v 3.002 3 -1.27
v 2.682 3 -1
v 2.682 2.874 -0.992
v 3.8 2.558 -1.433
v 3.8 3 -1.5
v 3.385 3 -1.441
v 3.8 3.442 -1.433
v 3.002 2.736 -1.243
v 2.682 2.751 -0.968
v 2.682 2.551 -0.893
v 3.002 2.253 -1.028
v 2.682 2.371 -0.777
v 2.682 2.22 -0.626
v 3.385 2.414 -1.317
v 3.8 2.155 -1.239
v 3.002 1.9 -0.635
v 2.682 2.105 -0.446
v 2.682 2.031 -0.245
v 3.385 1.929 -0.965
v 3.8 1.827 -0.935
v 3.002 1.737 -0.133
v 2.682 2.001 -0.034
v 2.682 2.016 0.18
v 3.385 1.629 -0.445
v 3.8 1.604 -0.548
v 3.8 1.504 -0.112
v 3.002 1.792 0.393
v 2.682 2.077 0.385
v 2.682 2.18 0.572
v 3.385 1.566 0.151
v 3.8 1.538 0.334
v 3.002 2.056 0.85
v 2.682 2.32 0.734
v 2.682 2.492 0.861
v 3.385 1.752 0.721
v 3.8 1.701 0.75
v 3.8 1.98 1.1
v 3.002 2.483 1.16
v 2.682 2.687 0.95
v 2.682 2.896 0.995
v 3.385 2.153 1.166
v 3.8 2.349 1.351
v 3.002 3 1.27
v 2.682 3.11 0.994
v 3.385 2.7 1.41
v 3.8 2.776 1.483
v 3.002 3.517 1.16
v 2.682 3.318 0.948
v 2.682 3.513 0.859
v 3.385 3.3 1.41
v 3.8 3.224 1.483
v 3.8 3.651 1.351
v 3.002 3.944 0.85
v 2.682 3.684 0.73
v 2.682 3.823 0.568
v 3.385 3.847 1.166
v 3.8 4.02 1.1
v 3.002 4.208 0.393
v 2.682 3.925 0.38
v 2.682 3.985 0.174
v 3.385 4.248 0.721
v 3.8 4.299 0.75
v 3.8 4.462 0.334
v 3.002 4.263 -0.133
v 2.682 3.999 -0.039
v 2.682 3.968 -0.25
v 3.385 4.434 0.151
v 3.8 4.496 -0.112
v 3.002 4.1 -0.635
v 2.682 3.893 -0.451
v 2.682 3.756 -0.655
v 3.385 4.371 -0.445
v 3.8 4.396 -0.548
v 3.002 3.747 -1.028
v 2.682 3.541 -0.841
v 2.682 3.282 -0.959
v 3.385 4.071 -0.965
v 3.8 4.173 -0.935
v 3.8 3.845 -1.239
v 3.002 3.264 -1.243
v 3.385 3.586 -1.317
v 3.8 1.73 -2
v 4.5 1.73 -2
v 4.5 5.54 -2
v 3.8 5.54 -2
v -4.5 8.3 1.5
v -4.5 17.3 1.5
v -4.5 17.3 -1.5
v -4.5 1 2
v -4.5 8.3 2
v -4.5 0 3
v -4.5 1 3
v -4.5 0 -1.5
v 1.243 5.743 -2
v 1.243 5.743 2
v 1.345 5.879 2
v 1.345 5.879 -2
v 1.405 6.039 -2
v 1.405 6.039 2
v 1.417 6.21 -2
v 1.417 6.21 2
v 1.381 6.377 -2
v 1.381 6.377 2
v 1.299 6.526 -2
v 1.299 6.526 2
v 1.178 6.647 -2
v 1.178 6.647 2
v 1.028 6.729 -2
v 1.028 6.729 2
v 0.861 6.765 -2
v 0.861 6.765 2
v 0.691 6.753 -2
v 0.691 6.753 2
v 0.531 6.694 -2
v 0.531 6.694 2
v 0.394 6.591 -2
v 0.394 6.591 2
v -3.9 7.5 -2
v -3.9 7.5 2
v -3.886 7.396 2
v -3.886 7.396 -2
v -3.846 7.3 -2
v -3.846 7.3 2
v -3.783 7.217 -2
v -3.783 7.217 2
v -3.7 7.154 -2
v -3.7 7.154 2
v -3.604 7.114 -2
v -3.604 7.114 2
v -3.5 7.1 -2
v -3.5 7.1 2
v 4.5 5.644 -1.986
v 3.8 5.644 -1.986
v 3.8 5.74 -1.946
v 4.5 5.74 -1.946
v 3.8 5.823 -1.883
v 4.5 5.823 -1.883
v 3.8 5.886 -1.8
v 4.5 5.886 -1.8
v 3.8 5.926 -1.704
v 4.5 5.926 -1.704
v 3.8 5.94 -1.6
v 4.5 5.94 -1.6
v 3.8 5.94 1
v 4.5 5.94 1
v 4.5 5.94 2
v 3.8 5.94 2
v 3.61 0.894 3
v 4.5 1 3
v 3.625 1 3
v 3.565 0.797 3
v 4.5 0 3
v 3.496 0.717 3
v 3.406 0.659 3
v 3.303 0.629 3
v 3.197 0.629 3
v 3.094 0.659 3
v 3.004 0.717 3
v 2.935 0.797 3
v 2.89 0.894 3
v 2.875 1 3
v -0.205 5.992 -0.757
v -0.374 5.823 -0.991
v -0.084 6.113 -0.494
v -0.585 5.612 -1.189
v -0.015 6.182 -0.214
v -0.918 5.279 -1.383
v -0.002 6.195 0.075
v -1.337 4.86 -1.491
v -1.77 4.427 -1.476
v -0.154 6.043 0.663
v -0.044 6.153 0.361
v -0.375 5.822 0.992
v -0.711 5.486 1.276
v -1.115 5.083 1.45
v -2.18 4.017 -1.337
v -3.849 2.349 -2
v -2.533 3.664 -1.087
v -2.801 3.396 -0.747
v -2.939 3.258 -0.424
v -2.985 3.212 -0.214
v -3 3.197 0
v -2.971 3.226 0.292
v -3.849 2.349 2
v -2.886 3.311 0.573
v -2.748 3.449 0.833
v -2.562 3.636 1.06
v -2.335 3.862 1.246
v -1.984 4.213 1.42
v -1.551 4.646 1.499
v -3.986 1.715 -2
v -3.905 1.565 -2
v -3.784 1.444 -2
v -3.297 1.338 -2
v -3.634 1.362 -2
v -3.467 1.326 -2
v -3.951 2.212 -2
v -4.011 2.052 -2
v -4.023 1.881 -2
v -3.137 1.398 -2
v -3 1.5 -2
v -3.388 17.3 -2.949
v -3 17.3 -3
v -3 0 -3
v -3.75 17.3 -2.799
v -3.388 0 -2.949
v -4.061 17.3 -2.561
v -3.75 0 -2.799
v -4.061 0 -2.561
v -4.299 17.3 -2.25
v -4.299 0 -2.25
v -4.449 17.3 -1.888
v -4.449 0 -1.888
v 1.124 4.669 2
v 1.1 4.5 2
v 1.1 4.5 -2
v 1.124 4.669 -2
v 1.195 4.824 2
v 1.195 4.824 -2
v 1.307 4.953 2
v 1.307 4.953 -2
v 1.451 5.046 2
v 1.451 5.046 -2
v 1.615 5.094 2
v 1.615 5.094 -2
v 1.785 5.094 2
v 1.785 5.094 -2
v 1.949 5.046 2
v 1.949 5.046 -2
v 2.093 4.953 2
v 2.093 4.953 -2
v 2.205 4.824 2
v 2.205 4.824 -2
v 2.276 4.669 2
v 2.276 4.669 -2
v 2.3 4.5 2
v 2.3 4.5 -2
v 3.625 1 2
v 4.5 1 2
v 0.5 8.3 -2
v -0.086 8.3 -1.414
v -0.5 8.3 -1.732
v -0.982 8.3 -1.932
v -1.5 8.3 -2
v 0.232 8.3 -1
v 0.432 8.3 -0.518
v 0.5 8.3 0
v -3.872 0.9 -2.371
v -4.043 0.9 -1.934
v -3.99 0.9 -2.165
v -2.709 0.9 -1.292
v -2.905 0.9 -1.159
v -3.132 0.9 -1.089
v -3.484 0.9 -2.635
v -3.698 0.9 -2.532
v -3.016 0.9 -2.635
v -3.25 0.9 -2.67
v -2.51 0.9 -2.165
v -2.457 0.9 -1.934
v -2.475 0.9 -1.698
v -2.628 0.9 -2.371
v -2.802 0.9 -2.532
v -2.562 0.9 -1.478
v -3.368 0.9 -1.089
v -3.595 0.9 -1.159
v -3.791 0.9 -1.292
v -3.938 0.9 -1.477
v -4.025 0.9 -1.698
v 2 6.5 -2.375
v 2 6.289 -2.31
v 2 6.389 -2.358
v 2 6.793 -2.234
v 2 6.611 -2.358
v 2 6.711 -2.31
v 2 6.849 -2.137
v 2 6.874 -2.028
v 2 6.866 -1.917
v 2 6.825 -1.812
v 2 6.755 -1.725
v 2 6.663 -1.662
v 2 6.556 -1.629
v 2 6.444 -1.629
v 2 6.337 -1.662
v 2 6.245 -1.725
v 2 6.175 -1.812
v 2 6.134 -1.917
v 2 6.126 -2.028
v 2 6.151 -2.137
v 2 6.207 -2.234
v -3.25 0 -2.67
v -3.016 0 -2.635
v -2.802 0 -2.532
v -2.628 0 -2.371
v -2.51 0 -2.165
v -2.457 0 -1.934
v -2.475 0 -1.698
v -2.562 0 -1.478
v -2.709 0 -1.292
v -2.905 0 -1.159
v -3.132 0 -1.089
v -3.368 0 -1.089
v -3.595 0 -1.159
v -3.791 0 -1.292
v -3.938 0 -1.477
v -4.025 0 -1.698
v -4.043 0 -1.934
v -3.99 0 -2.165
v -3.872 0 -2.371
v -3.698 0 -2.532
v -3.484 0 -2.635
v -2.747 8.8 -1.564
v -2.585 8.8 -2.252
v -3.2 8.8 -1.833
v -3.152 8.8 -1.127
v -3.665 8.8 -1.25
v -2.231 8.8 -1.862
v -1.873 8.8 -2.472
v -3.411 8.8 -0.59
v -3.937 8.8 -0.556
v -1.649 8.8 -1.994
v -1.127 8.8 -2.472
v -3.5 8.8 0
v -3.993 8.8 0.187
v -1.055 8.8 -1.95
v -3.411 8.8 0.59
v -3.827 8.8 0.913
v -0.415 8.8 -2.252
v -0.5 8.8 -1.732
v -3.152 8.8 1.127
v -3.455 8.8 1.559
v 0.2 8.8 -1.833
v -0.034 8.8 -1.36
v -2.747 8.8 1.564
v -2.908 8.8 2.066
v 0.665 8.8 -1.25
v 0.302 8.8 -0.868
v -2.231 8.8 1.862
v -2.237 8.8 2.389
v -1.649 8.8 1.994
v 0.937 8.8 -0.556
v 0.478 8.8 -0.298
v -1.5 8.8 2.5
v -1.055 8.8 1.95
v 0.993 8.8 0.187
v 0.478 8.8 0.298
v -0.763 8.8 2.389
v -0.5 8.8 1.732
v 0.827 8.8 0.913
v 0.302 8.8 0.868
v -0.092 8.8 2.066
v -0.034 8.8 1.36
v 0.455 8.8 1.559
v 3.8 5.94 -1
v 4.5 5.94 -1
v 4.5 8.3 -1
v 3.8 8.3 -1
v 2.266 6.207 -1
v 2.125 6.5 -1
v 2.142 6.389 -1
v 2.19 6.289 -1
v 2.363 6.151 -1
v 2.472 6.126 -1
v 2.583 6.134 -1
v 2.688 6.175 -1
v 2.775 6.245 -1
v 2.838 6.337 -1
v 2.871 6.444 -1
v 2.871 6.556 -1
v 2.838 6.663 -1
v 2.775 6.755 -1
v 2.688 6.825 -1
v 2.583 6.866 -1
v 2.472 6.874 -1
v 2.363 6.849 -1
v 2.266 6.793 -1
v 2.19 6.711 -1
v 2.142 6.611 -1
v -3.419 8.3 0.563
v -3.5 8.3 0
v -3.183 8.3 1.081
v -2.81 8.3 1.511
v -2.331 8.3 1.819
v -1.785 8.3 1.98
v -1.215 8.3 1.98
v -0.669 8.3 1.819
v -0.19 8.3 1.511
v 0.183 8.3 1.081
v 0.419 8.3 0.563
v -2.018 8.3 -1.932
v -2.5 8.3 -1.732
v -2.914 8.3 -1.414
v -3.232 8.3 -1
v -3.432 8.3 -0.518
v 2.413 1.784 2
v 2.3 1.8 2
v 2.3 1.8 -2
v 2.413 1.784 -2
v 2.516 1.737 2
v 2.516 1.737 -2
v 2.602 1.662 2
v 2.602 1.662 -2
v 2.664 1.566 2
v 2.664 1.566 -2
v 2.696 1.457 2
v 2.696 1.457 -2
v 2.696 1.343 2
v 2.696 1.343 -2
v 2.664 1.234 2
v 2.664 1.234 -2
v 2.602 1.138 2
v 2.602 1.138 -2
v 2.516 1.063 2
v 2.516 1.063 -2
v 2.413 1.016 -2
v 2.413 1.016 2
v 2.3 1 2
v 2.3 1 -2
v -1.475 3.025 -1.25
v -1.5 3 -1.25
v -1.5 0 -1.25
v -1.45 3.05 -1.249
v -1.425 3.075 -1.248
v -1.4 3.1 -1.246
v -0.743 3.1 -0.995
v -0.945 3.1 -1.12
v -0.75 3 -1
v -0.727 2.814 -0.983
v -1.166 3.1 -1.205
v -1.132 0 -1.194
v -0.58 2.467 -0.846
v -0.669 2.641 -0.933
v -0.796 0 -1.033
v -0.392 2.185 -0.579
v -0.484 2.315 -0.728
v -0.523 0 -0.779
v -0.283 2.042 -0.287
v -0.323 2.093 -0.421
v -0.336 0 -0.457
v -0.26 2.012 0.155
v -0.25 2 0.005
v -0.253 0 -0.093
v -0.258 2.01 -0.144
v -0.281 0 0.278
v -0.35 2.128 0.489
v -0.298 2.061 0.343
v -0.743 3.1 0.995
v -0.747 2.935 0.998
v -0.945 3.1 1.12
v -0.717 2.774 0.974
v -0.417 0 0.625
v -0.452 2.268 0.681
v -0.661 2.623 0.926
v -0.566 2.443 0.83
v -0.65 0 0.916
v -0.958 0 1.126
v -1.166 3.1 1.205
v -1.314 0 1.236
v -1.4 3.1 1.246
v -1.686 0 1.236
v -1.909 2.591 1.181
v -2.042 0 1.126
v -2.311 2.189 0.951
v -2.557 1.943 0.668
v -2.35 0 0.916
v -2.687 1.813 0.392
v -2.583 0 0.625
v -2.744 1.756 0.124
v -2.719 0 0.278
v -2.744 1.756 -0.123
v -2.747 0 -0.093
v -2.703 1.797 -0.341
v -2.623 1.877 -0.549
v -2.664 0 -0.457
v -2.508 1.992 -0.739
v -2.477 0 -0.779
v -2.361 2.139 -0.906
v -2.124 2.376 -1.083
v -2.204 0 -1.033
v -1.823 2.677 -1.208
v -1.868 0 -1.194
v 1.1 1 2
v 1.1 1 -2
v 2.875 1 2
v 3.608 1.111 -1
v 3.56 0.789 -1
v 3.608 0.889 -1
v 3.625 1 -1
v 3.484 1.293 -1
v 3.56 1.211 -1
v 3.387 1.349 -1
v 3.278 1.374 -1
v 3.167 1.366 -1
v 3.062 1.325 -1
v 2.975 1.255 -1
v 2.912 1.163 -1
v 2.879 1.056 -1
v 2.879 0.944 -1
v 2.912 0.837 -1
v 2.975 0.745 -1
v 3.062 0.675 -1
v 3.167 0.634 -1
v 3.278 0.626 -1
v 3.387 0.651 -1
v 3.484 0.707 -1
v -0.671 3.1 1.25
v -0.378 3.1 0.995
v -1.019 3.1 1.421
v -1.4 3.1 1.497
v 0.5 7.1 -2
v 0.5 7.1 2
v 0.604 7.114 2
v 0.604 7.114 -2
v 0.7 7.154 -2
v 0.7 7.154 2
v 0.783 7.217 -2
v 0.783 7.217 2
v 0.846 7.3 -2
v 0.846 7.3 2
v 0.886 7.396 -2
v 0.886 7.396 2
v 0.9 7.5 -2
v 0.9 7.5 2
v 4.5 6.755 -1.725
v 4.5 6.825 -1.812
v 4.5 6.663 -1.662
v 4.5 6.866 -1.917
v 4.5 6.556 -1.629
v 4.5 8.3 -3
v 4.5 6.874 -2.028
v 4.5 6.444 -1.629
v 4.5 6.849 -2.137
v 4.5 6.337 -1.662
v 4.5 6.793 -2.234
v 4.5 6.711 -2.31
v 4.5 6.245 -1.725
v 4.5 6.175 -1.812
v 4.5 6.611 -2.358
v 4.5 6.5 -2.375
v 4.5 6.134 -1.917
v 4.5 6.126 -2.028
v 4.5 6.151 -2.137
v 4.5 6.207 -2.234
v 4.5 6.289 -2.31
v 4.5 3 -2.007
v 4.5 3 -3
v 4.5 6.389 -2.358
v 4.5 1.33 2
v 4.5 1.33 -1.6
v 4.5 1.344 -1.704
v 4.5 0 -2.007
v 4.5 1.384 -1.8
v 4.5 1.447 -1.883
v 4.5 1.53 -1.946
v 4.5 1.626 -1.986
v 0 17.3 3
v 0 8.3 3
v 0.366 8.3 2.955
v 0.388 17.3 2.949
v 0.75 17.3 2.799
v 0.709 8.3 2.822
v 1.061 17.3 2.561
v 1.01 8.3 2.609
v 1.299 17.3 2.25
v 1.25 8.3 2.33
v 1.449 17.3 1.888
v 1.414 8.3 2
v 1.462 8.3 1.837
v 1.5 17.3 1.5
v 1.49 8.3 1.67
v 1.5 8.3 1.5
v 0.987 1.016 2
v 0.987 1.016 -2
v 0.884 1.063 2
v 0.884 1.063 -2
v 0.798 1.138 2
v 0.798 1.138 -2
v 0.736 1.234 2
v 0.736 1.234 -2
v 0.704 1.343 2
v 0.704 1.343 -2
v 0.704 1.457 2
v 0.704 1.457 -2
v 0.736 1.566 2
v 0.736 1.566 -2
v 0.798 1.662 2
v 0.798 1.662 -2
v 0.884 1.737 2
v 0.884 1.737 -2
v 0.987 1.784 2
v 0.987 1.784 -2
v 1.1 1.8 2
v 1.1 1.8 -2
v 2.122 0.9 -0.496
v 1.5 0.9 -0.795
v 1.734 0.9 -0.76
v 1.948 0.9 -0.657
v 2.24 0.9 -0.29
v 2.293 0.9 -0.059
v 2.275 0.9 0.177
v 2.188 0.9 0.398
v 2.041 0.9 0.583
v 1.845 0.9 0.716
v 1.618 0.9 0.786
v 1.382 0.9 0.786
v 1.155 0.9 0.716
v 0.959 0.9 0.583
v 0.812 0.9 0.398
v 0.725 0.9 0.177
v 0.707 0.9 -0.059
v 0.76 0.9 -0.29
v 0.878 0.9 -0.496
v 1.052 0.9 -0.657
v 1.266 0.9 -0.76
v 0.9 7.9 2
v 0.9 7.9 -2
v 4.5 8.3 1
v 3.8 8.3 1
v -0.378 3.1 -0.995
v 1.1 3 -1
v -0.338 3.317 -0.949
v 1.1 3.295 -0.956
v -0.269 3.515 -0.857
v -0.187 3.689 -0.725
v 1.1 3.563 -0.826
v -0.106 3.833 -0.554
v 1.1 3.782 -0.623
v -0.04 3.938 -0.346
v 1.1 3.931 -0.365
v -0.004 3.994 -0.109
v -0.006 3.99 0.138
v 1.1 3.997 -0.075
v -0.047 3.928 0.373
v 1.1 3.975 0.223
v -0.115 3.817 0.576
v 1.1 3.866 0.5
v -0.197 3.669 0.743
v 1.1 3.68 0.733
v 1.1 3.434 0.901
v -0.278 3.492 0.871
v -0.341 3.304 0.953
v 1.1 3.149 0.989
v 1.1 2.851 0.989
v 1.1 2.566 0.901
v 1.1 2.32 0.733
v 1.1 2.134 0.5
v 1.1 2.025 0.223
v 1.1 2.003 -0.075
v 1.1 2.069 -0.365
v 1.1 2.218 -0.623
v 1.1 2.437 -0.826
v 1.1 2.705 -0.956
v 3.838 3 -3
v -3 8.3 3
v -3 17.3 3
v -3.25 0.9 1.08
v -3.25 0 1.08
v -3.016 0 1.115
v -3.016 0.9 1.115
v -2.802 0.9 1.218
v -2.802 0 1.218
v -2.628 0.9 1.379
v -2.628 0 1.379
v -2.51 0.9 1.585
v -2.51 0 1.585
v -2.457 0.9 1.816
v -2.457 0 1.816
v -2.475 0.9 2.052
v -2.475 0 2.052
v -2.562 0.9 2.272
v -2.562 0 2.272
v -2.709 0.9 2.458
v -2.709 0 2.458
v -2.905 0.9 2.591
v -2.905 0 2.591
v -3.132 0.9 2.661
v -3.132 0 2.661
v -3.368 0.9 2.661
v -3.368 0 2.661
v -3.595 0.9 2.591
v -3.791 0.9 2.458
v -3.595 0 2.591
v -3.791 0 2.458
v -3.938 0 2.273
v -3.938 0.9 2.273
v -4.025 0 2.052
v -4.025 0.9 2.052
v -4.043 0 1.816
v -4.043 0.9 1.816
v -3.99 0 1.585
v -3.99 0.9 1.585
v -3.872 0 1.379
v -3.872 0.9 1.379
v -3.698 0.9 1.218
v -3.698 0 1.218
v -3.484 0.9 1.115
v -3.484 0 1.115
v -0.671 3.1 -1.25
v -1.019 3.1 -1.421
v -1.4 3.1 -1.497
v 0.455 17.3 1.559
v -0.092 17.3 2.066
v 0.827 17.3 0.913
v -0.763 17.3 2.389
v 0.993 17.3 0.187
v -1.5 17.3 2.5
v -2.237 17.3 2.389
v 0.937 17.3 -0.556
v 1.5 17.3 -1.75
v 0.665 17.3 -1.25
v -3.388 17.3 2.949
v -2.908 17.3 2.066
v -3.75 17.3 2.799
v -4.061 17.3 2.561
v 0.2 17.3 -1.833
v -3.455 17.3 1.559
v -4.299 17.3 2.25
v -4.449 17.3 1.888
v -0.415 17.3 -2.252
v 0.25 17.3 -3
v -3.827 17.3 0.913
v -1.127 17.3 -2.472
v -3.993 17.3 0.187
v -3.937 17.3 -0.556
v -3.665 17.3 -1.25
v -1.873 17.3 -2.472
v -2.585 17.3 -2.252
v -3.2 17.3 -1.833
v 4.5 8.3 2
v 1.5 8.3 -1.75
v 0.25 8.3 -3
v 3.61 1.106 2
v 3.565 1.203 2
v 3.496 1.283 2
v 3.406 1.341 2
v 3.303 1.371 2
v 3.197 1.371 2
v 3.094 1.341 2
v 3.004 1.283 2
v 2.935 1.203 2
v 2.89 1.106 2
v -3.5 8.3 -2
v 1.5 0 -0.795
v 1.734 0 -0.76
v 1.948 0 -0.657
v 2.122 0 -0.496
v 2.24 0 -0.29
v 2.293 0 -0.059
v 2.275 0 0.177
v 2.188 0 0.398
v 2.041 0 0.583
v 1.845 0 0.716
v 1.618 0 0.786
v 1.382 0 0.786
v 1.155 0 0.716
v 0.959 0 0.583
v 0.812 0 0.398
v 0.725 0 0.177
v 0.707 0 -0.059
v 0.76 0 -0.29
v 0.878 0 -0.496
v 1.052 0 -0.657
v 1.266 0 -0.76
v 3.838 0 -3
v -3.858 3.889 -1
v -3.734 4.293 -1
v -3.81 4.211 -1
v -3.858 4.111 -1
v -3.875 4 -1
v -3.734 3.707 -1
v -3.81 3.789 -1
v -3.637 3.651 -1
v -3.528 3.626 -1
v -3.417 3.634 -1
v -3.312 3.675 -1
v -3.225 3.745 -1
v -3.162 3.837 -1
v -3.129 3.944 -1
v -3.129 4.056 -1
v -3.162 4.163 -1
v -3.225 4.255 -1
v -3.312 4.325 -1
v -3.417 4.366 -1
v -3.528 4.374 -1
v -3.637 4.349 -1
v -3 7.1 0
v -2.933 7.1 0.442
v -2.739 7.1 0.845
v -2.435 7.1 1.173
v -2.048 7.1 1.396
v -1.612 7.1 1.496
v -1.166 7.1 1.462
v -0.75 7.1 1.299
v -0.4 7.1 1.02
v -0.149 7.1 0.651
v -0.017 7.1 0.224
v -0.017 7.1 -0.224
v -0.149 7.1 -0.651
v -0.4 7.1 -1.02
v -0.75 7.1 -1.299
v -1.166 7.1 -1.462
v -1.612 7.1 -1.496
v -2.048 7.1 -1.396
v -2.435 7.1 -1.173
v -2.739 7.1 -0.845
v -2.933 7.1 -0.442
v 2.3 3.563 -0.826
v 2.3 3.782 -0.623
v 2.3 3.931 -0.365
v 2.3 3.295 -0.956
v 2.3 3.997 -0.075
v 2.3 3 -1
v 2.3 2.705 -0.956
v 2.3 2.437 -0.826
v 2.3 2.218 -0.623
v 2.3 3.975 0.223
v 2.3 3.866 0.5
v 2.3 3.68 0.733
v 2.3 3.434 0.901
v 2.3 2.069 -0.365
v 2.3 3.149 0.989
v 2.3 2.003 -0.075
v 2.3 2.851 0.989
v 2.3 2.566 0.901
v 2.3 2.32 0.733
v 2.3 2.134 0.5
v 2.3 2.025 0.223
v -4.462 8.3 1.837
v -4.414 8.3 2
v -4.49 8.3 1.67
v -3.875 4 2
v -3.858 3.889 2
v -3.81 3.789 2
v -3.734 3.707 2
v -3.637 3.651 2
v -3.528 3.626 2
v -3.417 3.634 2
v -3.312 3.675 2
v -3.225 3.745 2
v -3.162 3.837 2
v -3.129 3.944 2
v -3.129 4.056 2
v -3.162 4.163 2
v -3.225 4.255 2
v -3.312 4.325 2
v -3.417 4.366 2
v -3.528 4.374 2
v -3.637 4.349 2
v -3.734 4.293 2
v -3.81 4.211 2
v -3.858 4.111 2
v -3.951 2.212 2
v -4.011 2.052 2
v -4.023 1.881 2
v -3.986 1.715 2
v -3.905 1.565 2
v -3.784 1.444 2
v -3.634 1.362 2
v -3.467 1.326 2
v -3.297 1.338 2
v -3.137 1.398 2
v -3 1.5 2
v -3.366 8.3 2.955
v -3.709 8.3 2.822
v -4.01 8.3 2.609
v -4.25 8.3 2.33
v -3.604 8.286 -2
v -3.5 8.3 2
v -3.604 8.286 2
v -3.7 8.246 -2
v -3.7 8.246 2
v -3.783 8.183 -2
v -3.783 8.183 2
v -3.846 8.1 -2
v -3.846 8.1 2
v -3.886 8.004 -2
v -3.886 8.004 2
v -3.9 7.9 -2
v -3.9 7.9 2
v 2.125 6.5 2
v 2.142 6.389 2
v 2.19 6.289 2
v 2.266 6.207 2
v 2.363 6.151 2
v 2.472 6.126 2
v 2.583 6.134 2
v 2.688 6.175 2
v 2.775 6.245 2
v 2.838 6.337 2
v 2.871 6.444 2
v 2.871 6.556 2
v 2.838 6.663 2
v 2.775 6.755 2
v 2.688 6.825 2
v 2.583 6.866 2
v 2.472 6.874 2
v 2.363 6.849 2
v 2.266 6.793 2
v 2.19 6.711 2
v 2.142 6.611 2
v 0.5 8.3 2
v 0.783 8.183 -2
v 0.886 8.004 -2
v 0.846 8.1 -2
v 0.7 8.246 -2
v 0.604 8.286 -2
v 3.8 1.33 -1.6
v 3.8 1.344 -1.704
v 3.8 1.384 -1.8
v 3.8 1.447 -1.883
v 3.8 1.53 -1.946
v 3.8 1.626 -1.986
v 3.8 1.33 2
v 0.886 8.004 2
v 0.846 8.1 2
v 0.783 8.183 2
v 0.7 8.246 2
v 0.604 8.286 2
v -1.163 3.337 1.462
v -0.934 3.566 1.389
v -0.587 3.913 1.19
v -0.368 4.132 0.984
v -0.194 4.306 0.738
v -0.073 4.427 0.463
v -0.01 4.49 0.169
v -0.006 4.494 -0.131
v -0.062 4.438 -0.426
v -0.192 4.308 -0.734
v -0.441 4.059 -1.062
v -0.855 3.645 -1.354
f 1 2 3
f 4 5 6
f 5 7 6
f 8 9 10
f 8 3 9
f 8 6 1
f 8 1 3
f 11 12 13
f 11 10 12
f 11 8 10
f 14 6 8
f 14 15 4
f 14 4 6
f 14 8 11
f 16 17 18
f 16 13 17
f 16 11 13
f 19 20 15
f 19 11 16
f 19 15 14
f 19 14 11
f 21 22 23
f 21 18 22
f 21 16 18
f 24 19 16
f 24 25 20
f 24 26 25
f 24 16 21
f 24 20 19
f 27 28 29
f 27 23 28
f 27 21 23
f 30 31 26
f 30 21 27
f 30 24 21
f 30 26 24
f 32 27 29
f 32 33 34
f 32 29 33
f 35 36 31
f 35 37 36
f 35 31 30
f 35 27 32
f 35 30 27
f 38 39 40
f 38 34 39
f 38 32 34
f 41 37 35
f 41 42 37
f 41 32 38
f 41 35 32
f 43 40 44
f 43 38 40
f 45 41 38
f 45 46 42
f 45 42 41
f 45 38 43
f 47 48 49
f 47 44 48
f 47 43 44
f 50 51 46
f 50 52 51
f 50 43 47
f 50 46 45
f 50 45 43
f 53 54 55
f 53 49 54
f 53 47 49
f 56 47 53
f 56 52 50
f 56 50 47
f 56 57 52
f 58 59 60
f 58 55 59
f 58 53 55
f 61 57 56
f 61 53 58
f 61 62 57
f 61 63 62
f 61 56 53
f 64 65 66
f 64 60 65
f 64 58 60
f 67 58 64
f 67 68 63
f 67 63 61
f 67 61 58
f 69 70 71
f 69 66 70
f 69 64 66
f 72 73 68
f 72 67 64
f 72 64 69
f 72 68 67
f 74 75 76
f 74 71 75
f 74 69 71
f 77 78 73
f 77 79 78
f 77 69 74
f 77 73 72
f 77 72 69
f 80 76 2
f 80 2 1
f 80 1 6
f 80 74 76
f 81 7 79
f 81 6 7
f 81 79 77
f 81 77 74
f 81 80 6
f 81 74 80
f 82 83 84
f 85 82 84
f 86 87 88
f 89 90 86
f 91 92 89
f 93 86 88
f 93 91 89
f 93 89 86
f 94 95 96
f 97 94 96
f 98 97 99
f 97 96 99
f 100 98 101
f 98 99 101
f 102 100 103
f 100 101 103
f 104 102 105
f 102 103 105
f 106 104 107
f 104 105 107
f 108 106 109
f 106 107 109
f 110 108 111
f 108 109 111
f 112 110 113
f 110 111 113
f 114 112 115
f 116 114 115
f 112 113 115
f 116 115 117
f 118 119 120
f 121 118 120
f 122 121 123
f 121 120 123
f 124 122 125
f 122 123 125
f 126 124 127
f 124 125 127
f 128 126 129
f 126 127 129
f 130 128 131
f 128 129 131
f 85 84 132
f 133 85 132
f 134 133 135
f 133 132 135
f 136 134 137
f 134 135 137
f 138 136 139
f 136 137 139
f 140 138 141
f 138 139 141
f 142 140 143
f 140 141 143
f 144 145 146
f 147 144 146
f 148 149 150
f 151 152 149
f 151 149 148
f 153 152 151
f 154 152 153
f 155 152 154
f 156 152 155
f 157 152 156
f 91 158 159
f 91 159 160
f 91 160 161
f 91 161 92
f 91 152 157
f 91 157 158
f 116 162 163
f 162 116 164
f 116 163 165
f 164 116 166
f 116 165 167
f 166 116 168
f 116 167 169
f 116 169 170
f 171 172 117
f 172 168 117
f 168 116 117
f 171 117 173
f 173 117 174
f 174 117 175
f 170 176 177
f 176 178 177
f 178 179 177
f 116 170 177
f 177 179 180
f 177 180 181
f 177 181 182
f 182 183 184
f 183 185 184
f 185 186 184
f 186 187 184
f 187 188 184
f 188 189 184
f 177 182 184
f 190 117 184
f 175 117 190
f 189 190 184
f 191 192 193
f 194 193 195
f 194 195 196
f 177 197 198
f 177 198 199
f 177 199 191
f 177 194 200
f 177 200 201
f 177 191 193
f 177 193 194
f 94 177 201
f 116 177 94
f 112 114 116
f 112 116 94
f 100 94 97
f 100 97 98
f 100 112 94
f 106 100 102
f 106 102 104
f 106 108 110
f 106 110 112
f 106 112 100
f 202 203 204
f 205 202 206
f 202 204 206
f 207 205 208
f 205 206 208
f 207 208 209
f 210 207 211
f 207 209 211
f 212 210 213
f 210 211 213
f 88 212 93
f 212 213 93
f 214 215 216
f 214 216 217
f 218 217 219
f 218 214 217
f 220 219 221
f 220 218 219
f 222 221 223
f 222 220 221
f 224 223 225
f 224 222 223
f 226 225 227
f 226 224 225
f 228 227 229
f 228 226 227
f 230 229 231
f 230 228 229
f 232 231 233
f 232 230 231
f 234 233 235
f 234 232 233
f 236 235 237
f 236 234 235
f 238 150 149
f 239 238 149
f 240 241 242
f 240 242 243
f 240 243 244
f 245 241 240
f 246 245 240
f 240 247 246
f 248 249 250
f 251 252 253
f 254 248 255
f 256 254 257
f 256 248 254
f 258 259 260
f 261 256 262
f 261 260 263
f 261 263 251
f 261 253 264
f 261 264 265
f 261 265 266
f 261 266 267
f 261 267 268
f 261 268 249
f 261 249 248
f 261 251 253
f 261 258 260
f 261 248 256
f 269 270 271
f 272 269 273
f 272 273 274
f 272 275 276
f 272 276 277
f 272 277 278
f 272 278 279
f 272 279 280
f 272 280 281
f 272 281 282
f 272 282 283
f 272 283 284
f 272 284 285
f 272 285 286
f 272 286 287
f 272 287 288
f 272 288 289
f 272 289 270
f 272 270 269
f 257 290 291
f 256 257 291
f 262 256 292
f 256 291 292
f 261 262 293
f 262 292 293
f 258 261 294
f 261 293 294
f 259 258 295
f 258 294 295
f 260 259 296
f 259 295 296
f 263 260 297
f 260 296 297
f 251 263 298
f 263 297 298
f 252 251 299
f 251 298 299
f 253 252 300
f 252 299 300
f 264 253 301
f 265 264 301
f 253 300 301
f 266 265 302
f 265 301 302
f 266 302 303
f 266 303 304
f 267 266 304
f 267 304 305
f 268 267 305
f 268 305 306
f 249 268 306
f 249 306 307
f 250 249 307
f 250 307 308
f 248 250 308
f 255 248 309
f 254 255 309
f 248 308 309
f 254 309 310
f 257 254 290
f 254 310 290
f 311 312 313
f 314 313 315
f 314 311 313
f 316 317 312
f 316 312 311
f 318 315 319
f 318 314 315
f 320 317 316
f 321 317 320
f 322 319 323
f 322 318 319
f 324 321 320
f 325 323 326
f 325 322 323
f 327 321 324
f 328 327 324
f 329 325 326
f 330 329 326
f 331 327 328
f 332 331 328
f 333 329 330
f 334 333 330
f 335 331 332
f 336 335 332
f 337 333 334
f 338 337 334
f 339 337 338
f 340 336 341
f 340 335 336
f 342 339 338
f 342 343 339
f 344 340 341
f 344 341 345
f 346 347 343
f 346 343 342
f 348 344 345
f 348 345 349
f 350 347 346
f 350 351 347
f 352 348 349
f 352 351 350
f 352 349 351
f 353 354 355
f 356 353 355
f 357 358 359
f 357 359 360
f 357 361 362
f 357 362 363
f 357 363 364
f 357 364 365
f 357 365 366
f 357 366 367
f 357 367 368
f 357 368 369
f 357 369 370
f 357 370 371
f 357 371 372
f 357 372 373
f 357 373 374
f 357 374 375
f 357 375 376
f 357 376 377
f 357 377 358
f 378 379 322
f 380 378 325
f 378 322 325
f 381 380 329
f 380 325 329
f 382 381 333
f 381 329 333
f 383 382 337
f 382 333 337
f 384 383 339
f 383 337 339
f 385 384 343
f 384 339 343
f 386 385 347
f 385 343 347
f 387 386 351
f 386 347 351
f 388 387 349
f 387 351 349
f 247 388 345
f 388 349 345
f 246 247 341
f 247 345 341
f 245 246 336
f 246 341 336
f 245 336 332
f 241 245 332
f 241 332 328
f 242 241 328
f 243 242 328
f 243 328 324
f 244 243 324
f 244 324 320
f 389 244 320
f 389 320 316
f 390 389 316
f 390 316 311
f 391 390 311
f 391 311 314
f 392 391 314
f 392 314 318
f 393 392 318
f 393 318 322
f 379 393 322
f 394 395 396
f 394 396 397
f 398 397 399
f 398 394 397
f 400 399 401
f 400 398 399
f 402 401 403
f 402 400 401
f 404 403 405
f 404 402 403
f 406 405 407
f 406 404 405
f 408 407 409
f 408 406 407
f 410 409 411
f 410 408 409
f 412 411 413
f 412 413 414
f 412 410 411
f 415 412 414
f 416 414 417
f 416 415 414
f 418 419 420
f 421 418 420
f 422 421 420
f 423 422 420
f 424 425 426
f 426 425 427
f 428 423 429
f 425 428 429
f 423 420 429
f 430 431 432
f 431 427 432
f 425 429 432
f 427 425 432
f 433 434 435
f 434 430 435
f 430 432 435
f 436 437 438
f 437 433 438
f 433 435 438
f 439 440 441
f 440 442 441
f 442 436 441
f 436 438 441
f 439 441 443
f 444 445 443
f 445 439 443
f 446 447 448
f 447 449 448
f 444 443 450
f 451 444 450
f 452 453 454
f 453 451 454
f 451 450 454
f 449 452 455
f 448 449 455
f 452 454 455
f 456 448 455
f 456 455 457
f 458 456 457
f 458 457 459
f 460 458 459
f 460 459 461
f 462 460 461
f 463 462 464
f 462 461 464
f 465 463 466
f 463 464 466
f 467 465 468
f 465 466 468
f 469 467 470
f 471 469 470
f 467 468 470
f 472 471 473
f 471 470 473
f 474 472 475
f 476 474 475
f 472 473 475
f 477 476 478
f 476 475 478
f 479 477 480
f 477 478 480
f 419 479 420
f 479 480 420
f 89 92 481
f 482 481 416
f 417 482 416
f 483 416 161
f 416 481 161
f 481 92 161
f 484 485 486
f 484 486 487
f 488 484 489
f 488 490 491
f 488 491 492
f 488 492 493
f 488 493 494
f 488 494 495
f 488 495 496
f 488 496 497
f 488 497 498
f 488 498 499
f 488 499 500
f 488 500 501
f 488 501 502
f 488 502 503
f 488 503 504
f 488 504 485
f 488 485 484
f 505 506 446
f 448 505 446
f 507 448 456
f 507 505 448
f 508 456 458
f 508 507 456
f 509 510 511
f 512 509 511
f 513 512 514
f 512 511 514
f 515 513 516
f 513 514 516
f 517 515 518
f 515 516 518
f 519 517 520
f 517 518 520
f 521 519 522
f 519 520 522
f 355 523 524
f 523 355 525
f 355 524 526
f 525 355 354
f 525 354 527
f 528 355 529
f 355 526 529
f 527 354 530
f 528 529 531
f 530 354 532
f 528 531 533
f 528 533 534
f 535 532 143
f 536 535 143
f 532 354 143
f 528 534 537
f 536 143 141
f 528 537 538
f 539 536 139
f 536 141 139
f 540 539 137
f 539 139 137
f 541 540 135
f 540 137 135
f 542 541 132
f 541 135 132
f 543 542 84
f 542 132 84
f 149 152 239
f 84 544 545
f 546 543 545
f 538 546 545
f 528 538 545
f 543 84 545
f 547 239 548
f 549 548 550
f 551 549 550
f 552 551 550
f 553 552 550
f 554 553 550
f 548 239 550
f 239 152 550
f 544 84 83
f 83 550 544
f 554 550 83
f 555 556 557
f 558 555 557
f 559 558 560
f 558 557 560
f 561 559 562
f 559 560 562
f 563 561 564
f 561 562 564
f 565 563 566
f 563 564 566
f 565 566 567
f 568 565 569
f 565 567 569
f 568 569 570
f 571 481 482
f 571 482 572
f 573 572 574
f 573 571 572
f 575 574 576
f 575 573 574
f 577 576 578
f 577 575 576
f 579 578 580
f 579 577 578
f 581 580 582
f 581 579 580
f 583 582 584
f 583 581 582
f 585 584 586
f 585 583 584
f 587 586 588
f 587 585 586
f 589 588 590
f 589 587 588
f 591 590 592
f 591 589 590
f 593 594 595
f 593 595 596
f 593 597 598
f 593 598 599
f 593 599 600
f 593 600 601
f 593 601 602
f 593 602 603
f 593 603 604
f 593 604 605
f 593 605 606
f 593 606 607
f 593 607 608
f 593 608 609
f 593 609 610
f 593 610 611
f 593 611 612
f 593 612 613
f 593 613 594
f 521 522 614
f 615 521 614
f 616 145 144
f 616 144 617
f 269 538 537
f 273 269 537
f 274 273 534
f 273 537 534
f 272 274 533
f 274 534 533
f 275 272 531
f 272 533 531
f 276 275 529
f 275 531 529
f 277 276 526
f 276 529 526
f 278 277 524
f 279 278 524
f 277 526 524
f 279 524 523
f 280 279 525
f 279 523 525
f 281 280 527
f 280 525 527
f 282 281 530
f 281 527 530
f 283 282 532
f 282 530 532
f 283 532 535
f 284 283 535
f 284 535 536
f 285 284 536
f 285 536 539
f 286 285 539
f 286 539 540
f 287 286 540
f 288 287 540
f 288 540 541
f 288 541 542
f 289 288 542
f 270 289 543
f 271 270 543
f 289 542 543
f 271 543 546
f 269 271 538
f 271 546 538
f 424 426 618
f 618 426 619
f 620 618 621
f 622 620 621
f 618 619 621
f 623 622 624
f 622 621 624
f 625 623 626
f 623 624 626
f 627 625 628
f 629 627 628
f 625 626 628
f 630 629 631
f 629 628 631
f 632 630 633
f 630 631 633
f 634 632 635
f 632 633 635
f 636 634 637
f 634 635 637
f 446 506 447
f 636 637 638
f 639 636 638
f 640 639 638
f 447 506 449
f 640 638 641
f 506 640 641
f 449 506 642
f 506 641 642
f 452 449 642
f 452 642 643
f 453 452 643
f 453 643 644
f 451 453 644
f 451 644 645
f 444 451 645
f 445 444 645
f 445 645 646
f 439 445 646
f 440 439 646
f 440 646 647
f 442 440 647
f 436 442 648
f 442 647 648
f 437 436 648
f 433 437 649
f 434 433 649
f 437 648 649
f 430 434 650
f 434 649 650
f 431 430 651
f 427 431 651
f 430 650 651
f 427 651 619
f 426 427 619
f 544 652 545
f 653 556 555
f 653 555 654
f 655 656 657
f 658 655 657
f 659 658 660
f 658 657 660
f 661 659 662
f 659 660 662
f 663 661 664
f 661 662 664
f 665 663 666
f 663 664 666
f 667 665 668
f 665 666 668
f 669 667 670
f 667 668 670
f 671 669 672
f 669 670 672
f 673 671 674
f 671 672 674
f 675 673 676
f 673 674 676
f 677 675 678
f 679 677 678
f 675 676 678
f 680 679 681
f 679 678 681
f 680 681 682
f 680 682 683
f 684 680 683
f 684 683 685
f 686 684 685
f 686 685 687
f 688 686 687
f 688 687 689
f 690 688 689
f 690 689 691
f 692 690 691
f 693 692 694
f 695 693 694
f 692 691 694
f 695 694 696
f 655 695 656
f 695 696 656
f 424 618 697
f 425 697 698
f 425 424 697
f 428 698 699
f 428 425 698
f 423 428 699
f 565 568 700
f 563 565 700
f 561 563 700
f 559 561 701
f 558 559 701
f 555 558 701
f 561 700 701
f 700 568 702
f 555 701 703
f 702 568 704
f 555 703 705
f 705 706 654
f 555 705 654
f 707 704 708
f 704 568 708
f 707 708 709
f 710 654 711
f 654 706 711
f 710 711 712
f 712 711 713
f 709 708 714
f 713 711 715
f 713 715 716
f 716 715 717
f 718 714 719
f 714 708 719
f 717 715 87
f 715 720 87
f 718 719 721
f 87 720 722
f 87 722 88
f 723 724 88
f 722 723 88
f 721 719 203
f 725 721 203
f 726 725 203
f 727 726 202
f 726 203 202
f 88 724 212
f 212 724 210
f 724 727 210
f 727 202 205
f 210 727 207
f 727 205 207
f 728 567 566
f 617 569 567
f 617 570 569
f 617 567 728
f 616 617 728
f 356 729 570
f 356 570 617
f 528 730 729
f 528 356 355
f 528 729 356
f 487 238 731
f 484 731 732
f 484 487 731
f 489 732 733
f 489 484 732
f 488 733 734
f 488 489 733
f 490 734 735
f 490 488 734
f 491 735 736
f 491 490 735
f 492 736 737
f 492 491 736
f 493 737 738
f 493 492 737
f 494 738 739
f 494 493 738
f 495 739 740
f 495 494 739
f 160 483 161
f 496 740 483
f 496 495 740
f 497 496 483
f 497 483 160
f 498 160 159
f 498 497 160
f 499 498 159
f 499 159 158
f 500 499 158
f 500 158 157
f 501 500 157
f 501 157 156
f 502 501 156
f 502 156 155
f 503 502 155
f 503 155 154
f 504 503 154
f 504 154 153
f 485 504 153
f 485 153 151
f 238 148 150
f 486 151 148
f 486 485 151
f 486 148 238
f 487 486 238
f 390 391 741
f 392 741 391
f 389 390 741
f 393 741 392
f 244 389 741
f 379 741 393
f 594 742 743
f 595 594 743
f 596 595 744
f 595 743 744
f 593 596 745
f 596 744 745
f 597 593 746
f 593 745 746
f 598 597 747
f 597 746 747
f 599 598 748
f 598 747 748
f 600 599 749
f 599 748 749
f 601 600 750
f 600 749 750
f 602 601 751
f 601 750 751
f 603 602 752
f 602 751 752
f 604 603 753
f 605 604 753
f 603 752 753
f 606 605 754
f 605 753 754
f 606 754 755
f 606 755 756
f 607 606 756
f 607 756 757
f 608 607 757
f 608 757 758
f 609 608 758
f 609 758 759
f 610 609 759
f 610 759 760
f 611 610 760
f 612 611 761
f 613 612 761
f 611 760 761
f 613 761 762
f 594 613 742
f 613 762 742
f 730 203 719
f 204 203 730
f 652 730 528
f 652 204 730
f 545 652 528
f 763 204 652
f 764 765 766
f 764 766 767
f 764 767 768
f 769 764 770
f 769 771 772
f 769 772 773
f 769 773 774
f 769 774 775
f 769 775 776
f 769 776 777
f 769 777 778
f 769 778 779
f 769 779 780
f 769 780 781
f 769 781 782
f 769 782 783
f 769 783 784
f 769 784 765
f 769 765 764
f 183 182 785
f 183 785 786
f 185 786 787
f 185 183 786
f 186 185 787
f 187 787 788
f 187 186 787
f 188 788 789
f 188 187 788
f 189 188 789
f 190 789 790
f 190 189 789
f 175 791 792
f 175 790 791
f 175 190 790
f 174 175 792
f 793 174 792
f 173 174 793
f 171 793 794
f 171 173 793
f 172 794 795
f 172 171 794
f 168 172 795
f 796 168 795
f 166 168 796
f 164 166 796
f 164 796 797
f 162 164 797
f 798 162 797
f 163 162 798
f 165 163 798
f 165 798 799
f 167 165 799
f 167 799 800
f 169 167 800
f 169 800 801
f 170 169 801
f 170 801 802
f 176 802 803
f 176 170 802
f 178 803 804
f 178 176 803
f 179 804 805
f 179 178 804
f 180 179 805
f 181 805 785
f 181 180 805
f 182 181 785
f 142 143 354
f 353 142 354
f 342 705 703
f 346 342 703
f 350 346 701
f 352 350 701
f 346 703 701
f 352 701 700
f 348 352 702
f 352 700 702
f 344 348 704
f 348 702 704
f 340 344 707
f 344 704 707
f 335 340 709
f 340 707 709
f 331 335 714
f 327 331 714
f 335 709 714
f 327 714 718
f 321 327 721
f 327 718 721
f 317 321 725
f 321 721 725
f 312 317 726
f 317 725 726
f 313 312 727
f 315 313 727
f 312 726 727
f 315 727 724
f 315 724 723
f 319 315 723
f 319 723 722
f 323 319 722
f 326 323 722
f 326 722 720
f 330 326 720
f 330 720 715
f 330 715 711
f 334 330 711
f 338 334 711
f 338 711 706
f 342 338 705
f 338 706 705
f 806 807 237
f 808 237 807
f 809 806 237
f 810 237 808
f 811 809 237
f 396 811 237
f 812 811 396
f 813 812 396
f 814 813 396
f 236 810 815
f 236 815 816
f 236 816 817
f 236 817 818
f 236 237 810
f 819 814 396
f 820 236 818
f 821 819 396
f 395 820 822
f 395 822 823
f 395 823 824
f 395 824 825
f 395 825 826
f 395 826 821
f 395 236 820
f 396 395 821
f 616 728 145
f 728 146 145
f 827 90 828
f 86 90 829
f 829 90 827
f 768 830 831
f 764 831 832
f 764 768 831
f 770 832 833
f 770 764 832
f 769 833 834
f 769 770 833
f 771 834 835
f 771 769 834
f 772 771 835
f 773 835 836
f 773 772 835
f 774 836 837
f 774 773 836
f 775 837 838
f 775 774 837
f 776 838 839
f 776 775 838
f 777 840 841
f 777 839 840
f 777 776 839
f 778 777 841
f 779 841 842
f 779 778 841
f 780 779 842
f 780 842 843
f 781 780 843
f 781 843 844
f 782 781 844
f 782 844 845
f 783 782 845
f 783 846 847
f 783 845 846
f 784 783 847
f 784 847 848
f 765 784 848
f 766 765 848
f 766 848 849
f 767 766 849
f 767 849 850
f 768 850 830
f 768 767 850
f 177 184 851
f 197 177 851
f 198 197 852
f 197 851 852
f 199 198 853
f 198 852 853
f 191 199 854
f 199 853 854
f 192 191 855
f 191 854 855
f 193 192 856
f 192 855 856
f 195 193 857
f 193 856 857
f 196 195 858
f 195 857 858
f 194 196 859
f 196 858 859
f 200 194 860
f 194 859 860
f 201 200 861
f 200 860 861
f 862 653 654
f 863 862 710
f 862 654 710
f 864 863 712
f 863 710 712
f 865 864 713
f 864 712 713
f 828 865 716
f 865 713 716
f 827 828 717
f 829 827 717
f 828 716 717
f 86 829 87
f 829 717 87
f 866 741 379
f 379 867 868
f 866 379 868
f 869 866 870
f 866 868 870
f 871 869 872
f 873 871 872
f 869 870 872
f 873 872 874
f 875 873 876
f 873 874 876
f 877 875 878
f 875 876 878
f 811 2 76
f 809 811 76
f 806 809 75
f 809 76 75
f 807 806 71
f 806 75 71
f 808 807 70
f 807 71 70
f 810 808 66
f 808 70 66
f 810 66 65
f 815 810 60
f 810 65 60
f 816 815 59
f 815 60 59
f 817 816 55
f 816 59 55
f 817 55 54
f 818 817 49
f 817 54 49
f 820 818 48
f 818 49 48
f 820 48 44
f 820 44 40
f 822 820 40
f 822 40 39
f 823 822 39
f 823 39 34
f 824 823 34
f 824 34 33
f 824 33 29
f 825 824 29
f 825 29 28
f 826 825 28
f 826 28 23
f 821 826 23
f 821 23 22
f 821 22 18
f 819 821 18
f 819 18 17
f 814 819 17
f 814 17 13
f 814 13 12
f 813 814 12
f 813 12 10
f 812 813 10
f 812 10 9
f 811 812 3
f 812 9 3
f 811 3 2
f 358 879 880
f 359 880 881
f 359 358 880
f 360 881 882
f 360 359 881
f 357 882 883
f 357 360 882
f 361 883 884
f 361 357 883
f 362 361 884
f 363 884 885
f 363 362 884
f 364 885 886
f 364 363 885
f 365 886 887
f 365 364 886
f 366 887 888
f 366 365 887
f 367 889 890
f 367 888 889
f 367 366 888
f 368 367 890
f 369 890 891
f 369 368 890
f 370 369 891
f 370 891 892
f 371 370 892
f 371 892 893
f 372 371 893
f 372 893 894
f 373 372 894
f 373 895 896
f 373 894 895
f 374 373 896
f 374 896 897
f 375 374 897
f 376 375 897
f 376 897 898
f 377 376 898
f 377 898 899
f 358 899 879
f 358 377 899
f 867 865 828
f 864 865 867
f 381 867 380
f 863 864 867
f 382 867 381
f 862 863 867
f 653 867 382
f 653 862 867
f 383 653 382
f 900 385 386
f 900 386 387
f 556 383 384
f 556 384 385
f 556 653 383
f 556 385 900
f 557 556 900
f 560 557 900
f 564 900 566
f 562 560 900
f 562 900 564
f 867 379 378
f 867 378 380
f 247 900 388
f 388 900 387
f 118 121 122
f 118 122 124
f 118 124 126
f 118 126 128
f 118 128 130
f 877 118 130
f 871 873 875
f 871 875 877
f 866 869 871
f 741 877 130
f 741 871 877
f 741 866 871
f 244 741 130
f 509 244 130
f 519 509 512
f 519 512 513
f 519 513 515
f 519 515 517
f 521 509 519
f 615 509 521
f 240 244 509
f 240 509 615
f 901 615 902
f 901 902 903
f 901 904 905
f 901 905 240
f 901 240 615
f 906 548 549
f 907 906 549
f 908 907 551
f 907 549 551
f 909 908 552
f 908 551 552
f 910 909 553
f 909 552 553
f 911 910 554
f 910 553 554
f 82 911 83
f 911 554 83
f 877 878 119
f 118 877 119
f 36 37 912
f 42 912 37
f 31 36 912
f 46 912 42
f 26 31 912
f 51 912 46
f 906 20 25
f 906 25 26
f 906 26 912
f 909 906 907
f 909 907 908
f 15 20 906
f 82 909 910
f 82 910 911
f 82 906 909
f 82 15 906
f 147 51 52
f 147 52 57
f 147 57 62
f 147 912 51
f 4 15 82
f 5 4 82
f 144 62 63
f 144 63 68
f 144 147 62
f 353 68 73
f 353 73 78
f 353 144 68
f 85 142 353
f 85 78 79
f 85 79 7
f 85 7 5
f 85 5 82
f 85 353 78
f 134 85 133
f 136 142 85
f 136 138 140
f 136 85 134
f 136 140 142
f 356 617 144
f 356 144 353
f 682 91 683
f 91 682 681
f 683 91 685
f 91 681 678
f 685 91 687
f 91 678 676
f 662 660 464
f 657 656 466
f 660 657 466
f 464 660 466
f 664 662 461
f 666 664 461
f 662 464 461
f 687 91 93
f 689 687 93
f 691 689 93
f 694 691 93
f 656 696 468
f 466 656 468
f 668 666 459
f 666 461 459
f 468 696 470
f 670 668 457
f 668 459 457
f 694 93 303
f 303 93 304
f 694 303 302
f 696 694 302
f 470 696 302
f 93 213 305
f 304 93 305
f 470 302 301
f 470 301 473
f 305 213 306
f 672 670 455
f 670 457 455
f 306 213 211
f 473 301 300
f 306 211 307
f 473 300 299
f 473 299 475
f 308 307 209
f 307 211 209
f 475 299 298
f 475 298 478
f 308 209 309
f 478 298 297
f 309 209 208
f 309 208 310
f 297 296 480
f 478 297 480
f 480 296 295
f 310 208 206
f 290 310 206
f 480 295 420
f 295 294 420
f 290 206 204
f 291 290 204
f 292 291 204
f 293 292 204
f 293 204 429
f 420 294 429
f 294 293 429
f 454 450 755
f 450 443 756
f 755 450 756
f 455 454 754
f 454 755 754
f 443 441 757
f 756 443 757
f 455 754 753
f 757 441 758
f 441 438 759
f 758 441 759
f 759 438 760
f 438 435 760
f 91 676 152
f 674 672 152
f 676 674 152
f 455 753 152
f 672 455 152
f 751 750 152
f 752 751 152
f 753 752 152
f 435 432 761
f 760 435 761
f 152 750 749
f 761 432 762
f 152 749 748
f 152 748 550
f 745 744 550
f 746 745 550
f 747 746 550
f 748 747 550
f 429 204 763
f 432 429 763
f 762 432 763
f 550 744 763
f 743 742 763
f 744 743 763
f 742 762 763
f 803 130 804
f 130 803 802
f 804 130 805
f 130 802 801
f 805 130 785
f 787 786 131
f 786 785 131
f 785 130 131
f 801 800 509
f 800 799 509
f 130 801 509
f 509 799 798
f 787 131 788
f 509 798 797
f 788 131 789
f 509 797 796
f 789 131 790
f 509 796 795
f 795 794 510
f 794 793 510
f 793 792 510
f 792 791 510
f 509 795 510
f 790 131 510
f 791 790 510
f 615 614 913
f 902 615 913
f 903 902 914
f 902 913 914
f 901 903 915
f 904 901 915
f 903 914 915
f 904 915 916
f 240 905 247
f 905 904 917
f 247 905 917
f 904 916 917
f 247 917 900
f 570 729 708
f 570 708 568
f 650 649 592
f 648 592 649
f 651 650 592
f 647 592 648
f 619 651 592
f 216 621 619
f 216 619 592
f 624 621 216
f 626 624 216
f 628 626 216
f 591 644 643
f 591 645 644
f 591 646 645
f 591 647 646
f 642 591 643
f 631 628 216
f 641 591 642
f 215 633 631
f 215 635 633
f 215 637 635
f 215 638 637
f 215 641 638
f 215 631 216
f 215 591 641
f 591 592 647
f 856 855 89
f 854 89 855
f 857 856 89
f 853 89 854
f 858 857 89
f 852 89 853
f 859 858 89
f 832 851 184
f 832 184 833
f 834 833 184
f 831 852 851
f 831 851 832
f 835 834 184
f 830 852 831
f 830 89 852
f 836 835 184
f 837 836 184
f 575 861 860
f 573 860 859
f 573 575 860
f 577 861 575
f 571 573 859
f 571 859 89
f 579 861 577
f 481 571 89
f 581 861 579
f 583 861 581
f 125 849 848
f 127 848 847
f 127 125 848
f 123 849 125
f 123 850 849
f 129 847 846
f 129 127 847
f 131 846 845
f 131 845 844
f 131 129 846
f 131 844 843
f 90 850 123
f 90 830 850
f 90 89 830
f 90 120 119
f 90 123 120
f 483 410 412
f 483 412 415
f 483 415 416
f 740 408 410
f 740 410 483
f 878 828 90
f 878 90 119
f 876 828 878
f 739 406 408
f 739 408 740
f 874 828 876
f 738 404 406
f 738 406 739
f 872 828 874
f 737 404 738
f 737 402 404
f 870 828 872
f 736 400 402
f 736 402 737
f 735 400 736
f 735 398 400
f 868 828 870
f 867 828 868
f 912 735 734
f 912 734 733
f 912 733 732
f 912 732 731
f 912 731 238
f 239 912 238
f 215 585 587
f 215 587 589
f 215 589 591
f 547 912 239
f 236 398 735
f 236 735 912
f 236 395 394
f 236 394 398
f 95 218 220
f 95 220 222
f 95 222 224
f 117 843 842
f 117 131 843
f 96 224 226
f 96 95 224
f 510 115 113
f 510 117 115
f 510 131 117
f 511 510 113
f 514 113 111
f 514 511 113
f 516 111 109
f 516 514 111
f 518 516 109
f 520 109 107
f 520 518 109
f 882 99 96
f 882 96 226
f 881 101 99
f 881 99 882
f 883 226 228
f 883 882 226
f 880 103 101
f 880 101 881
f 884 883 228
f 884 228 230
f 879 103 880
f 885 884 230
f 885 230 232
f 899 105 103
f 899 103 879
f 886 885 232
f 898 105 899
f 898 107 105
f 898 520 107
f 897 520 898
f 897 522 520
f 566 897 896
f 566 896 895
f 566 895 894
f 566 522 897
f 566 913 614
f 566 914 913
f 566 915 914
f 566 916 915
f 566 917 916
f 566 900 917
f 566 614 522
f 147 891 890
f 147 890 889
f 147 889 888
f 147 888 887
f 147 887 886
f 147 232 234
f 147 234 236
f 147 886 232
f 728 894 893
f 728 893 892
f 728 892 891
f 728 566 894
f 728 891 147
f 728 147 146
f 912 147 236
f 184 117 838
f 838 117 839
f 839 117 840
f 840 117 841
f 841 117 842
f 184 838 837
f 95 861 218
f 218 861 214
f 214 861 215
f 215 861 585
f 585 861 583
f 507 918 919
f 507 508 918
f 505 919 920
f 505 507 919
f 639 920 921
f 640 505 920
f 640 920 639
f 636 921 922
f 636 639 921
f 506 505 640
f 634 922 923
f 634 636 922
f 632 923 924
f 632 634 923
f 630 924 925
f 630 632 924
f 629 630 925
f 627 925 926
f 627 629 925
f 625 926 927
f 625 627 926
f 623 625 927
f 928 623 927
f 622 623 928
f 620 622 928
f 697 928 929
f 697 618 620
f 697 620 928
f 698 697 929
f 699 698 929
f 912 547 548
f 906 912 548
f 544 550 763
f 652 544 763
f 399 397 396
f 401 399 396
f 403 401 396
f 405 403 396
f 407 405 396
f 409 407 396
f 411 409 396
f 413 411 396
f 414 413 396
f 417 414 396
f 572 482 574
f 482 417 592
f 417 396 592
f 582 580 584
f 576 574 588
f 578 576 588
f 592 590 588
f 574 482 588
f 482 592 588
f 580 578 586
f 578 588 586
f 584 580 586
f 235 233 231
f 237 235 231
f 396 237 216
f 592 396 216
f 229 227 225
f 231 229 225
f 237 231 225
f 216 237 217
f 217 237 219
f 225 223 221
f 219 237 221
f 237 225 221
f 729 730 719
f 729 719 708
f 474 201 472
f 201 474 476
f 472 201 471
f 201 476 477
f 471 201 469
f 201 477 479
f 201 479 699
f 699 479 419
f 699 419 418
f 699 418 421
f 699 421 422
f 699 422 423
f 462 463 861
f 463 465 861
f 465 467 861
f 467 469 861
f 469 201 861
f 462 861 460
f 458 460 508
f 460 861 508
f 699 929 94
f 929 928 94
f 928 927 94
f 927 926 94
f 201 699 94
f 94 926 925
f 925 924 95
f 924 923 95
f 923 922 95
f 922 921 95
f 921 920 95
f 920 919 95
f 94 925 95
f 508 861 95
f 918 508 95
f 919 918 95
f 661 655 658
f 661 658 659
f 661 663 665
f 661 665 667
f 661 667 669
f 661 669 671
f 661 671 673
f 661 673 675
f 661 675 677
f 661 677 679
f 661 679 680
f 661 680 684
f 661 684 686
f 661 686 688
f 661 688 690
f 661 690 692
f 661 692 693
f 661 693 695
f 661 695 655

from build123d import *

# Parameters (mm, degrees)
SKETCH1_W                   = 9
SKETCH1_H                   = 6
MAIN_BODY_EXT_DEPTH         = 8.3
EMISSION_PATH_EXT_DEPTH     = 9
SKETCH3_R                   = 1.25
EMISSION_AND_GRIN_CUT_DEPTH = 19.125672401
SKETCH4_R                   = 1
DRUM_LENS_CUT_DEPTH         = 7
SKETCH5_W                   = 9
SKETCH5_H                   = 7.3
FILTERSET_CUT1_DEPTH        = 1
FILTERSET_CUT2_DEPTH        = 4
SKETCH10_R                  = 2.5
EMISSION_LENS_CUT_DEPTH     = 8.5
SKETCH15_R                  = 0.795
MAGNETS_CUT_DEPTH           = 0.9
SCREW_HOLES_CUT_DEPTH       = 19.561788707
SCREW_HOLES_CUT_DEPTH_BACK  = 3
SKETCH18_R                  = 0.375
EXTERNAL_FILLET_1_R         = 1.5
CUT_EXTRUDE8_DEPTH          = 12.545128843
CUT_EXTRUDE8_DEPTH_BACK     = 4
SKETCH28_R                  = 1.5
CUT_EXTRUDE9_DEPTH          = 3
CUT_EXTRUDE10_DEPTH         = 0.7
SKETCH29_R                  = 0.375
CUT_EXTRUDE11_DEPTH         = 2.5
SKETCH32_W                  = 2
SKETCH32_H                  = 2.36
CUT_EXTRUDE14_DEPTH         = 0.7
CUT_EXTRUDE16_DEPTH         = 9
CUT_EXTRUDE17_REACH         = 12.329
SKETCH37_R                  = 2


with BuildPart() as part:
    # Sketch1 → Main Body Ext (new body)
    with BuildSketch(Plane(origin=(0, 0, 0), x_dir=(1, 0, 0), z_dir=(0, 1, 0))):
        Rectangle(SKETCH1_W, SKETCH1_H)
    extrude(amount=MAIN_BODY_EXT_DEPTH)

    # Sketch8 → Emission Path Ext (add)
    with BuildSketch(Plane(origin=(0, 8.3, 0), x_dir=(1, 0, 0), z_dir=(0, 1, 0))):
        Polygon((0.25, 3), (1.5, 1.75), (1.5, -3), (-4.5, -3), (-4.5, 3), align=None)
    extrude(amount=EMISSION_PATH_EXT_DEPTH)

    # Sketch3 → Emission and Grin Cut (cut, through all)
    with BuildSketch(Plane.XZ):
        with Locations(Location((-1.5, 0, 0), (0, 0, 270))):
            Circle(SKETCH3_R)
    extrude(amount=-EMISSION_AND_GRIN_CUT_DEPTH, mode=Mode.SUBTRACT)

    # Sketch4 → Drum Lens Cut (cut)
    with BuildSketch(Plane(origin=(4.5, 0, 0), x_dir=(0, 0, -1), z_dir=(1, 0, 0))):
        with Locations((0, 3)):
            Circle(SKETCH4_R)
    extrude(amount=-DRUM_LENS_CUT_DEPTH, mode=Mode.SUBTRACT)

    # Sketch5 → FilterSet Cut1 (cut)
    with BuildSketch(Plane.XY.offset(3)):
        with Locations((0, 4.65)):
            Rectangle(SKETCH5_W, SKETCH5_H)
    extrude(amount=-FILTERSET_CUT1_DEPTH, mode=Mode.SUBTRACT)

    # Sketch6 → FilterSet Cut2 (cut)
    with BuildSketch(Plane.XY.offset(2)):
        with BuildLine():
            Line((2.3, 4.5), (2.3, 1.8))
            ThreePointArc((2.3, 1.8), (2.7, 1.4), (2.3, 1))
            Line((2.3, 1), (1.1, 1))
            ThreePointArc((1.1, 1), (0.7, 1.4), (1.1, 1.8))
            Line((1.1, 1.8), (1.1, 4.5))
            ThreePointArc((1.1, 4.5), (1.7, 5.1), (2.3, 4.5))
        make_face()
        with BuildLine():
            Line((-3.9, 7.9), (-3.9, 7.5))
            ThreePointArc((-3.9, 7.5), (-3.782842712, 7.217157288), (-3.5, 7.1))
            Line((-3.5, 7.1), (0.5, 7.1))
            ThreePointArc((0.5, 7.1), (0.782842712, 7.217157288), (0.9, 7.5))
            Line((0.9, 7.5), (0.9, 7.9))
            ThreePointArc((0.9, 7.9), (0.782842712, 8.182842712), (0.5, 8.3))
            Line((0.5, 8.3), (-3.5, 8.3))
            ThreePointArc((-3.5, 8.3), (-3.782842712, 8.182842712), (-3.9, 7.9))
        make_face()
        with BuildLine():
            Line((0.39411255, 6.591168825), (-3.848528137, 2.348528137))
            ThreePointArc((-3.848528137, 2.348528137), (-3.848528137, 1.5), (-3, 1.5))
            Line((-3, 1.5), (1.242640687, 5.742640687))
            ThreePointArc((1.242640687, 5.742640687), (1.242640687, 6.591168825), (0.39411255, 6.591168825))
        make_face()
    extrude(amount=-FILTERSET_CUT2_DEPTH, mode=Mode.SUBTRACT)

    # Sketch10 → Emission Lens Cut (cut)
    with BuildSketch(Plane(origin=(0, 17.3, 0), x_dir=(1, 0, 0), z_dir=(0, 1, 0))):
        with Locations(Location((-1.5, 0, 0), (0, 0, 270))):
            Circle(SKETCH10_R)
    extrude(amount=-EMISSION_LENS_CUT_DEPTH, mode=Mode.SUBTRACT)

    # Sketch15 → Magnets Cut (cut)
    with BuildSketch(Plane.XZ):
        with Locations(Location((-3.25, -1.875, 0), (0, 0, 270))):
            Circle(SKETCH15_R)
        with Locations(Location((-3.25, 1.875, 0), (0, 0, 270))):
            Circle(SKETCH15_R)
        with Locations(Location((1.5, 0, 0), (0, 0, 270))):
            Circle(SKETCH15_R)
    extrude(amount=-MAGNETS_CUT_DEPTH, mode=Mode.SUBTRACT)

    # Sketch18 → Screw Holes Cut (cut, two sides: drawn at the far end of the back side and taken through both)
    with BuildSketch(Plane.XY.offset(2).offset(-SCREW_HOLES_CUT_DEPTH_BACK)):
        with Locations(Location((-3.5, 4, 0), (0, 0, 180))):
            Circle(SKETCH18_R)
        with Locations(Location((2.5, 6.5, 0), (0, 0, 180))):
            Circle(SKETCH18_R)
        with Locations((3.25, 1)):
            Circle(SKETCH18_R)
    extrude(amount=SCREW_HOLES_CUT_DEPTH + SCREW_HOLES_CUT_DEPTH_BACK, mode=Mode.SUBTRACT)

    # External Fillet 1
    # the kernel refuses this fillet: 1.5 mm, written as the material it takes off along each edge
    with BuildSketch(Plane(origin=(1.5, 8.3, 3), x_dir=(0, 0, -1), z_dir=(0, 1, 0))) as external_fillet_1_piece_1:
        with BuildLine():
            CenterArc((EXTERNAL_FILLET_1_R, EXTERNAL_FILLET_1_R), EXTERNAL_FILLET_1_R, 180, 90)
            Line((0, EXTERNAL_FILLET_1_R), (0, 0))
            Line((0, 0), (EXTERNAL_FILLET_1_R, 0))
        make_face()
    extrude(amount=12.75, mode=Mode.SUBTRACT)
    with BuildSketch(Plane(origin=(-4.5, -3.75, -3), x_dir=(1, 0, 0), z_dir=(0, 1, 0))) as external_fillet_1_piece_2:
        with BuildLine():
            CenterArc((EXTERNAL_FILLET_1_R, -EXTERNAL_FILLET_1_R), EXTERNAL_FILLET_1_R, 90, 90)
            Line((0, -EXTERNAL_FILLET_1_R), (0, 0))
            Line((0, 0), (EXTERNAL_FILLET_1_R, 0))
        make_face()
    extrude(amount=24.8, mode=Mode.SUBTRACT)

    # Sketch28 → Cut-Extrude8 (cut, two sides: drawn at the far end of the back side and taken through both)
    with BuildSketch(Plane(origin=(0, 7.1, 0), x_dir=(1, 0, 0), z_dir=(0, 1, 0)).offset(-CUT_EXTRUDE8_DEPTH_BACK)):
        with Locations(Location((-1.5, 0, 0), (0, 0, 180))):
            Circle(SKETCH28_R)
    extrude(amount=CUT_EXTRUDE8_DEPTH + CUT_EXTRUDE8_DEPTH_BACK, mode=Mode.SUBTRACT)

    # Sketch14 → Cut-Extrude9 (cut)
    with BuildSketch(Plane.XZ):
        Polygon((4.5, -3), (4.5, -2.006698359), (3.837798906, -3), align=None)
    extrude(amount=-CUT_EXTRUDE9_DEPTH, mode=Mode.SUBTRACT)

    # Sketch12 → Cut-Extrude10 (cut)
    with BuildSketch(Plane(origin=(4.5, 0, 0), x_dir=(0, 0, -1), z_dir=(1, 0, 0))):
        with BuildLine():
            Line((1.6, 5.94), (-1.6, 5.94))
            Line((-1.6, 5.94), (-2, 5.94))
            Line((-2, 5.94), (-2, 1.33))
            Line((-2, 1.33), (1.6, 1.33))
            ThreePointArc((1.6, 1.33), (1.882842712, 1.447157288), (2, 1.73))
            Line((2, 1.73), (2, 5.54))
            ThreePointArc((2, 5.54), (1.882842712, 5.822842712), (1.6, 5.94))
        make_face()
    extrude(amount=-CUT_EXTRUDE10_DEPTH, mode=Mode.SUBTRACT)

    # Sketch29 → Cut-Extrude11 (cut)
    with BuildSketch(Plane(origin=(4.5, 0, 0), x_dir=(0, 0, -1), z_dir=(1, 0, 0))):
        with Locations((2, 6.5)):
            Circle(SKETCH29_R)
    extrude(amount=-CUT_EXTRUDE11_DEPTH, mode=Mode.SUBTRACT)

    # Sketch32 → Cut-Extrude14 (cut)
    with BuildSketch(Plane(origin=(4.5, 0, 0), x_dir=(0, 0, -1), z_dir=(1, 0, 0))):
        with Locations((0, 7.12)):
            Rectangle(SKETCH32_W, SKETCH32_H)
    extrude(amount=-CUT_EXTRUDE14_DEPTH, mode=Mode.SUBTRACT)

    # Sketch33 → Cut-Revolve1 (revolve, cut)
    with BuildSketch(Plane.XY, mode=Mode.PRIVATE) as cut_revolve1_sk:
        with BuildLine():
            Line((3.8, 3), (2.3, 3))
            ThreePointArc((2.3, 3), (2.739339828, 4.060660172), (3.8, 4.5))
            Line((3.8, 4.5), (3.8, 3))
        make_face()
    revolve(cut_revolve1_sk.sketch.rotate(Axis((3.8, 3, 0), (-1, 0, 0)), 90), axis=Axis((3.8, 3, 0), (-1, 0, 0)), mode=Mode.SUBTRACT)

    # Sketch36 → Cut-Extrude16 (cut)
    with BuildSketch(Plane(origin=(0, 17.3, 0), x_dir=(1, 0, 0), z_dir=(0, 1, 0))):
        with BuildLine():
            Line((-4.5, -1.5), (-4.5, -3))
            Line((-4.5, -3), (-3, -3))
            ThreePointArc((-3, -3), (-4.060660172, -2.560660172), (-4.5, -1.5))
        make_face()
    extrude(amount=-CUT_EXTRUDE16_DEPTH, mode=Mode.SUBTRACT)

    # Sketch37 → Cut-Extrude17 (cut, up to next)
    with BuildSketch(Plane(origin=(0, 8.8, 0), x_dir=(1, 0, 0), z_dir=(0, 1, 0)), mode=Mode.PRIVATE) as cut_extrude17_sk1:
        with Locations(Location((-1.5, 0, 0), (0, 0, 180))):
            Circle(SKETCH37_R)
    cut_extrude17_tool1 = extrude(cut_extrude17_sk1.sketch, amount=-CUT_EXTRUDE17_REACH, mode=Mode.PRIVATE) & part.part
    add(cut_extrude17_tool1.solids().sort_by_distance((-1.5, 8.8, 0))[0], mode=Mode.SUBTRACT)


solid = part.part
